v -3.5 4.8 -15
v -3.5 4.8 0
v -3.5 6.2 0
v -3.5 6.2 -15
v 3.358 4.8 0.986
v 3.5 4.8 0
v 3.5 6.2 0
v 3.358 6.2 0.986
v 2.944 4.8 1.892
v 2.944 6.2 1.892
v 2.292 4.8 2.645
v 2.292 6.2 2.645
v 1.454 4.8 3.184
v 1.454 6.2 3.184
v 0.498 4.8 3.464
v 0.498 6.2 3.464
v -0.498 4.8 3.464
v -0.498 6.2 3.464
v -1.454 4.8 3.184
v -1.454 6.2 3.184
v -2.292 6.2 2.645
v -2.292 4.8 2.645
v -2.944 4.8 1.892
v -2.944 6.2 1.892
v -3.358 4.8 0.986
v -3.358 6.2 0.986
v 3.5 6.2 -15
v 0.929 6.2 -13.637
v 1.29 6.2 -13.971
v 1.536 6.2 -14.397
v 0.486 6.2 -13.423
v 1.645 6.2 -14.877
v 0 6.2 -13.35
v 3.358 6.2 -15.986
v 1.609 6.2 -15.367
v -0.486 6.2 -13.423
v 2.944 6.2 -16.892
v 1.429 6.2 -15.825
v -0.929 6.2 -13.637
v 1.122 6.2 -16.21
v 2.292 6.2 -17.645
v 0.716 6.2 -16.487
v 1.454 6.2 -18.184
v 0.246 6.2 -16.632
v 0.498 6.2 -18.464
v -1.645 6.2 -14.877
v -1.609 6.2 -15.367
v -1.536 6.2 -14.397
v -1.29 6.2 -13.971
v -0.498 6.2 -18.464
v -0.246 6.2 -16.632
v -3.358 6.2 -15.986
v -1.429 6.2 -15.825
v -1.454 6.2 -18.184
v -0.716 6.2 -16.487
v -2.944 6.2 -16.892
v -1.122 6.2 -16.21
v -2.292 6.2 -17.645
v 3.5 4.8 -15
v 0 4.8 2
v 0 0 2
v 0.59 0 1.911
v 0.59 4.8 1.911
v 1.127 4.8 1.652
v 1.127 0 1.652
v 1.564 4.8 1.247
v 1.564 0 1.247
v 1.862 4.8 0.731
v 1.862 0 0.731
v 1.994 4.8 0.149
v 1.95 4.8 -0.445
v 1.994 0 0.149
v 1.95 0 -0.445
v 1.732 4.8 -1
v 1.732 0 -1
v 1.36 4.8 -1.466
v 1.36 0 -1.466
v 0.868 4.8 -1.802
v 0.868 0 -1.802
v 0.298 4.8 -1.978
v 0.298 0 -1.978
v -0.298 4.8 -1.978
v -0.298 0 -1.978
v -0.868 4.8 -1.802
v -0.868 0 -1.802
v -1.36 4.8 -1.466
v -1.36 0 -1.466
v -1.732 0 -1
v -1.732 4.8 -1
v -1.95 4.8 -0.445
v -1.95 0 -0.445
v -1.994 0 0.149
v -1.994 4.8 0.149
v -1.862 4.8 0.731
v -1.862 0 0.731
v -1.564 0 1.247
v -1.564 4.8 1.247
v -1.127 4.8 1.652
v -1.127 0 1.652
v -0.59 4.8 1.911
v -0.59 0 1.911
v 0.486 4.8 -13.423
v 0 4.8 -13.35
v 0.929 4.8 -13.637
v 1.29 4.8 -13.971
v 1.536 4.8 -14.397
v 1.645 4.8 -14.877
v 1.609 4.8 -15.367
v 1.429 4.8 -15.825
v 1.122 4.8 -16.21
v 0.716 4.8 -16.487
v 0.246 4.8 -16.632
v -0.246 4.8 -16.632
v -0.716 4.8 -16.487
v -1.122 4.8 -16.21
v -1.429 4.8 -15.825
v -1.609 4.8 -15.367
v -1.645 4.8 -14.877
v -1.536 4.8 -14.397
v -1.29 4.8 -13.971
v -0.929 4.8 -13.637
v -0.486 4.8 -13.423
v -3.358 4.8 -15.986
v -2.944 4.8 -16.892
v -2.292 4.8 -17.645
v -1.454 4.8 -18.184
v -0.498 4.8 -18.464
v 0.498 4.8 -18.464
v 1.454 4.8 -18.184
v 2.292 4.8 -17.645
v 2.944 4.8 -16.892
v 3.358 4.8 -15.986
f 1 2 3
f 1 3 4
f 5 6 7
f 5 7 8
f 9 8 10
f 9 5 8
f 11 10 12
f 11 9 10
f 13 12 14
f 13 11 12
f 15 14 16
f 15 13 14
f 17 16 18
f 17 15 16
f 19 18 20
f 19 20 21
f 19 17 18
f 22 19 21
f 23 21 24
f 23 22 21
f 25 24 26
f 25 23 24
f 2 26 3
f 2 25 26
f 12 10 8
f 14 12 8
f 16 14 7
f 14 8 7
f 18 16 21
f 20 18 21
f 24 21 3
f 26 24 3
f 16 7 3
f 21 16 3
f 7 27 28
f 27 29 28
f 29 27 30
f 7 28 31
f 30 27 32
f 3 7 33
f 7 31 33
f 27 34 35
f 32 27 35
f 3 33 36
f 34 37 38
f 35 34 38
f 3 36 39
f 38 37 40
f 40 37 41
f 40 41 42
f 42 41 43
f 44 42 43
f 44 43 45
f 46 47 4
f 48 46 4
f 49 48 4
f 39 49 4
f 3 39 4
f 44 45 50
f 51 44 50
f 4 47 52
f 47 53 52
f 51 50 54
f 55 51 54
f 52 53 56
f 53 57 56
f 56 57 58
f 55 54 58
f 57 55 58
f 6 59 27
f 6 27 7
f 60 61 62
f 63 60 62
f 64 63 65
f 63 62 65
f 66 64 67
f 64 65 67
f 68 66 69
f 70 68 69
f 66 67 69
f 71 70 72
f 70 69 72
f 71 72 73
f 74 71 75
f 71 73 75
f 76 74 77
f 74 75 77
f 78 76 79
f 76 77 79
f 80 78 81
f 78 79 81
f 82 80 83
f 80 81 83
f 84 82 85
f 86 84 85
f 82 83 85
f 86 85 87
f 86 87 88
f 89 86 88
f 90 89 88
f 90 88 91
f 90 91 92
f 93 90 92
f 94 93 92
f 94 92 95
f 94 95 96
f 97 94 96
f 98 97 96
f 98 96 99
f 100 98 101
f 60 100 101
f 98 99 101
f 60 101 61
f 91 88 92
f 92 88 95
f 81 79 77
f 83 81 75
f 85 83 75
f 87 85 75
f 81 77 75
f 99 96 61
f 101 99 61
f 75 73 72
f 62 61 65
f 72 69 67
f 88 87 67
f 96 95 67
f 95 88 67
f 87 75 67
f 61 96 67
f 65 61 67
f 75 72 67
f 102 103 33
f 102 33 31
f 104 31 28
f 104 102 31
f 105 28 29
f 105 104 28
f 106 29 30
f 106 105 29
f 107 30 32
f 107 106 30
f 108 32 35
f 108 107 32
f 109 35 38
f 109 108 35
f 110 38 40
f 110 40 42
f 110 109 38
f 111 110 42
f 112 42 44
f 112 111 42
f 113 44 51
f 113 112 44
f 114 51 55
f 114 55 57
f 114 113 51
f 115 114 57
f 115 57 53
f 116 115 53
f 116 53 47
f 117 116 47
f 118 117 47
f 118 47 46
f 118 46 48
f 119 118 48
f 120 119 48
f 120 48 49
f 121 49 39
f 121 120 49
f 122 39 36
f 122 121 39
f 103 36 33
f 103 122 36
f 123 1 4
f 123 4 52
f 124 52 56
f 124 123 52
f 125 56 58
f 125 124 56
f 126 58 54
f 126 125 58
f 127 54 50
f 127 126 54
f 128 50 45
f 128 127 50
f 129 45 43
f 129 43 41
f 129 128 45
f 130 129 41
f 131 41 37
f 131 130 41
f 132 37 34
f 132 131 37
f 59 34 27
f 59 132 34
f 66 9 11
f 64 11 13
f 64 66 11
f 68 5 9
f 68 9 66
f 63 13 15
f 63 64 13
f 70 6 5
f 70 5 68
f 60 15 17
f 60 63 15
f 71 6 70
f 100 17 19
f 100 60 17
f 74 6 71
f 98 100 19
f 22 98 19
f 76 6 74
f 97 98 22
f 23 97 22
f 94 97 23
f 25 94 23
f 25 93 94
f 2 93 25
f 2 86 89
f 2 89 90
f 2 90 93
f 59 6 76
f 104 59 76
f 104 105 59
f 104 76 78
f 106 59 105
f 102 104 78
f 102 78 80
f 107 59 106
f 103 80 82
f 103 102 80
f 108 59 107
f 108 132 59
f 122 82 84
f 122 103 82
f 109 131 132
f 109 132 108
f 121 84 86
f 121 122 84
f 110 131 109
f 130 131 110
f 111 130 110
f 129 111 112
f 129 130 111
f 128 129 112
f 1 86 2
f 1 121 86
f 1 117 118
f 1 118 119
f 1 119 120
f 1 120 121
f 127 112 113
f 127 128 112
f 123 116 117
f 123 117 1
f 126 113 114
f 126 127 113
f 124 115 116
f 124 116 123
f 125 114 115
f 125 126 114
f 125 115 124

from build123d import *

# Parameters (mm, degrees)
SKETCH_1_R      = 2
EXTRUDE_1_DEPTH = 4.8
SKETCH_2_R      = 1.65
EXTRUDE_2_DEPTH = 1.4


with BuildPart() as part:
    # 草图1 → 凸台-拉伸1 (new body)
    with BuildSketch(Plane(origin=(0, 0, 0), x_dir=(1, 0, 0), z_dir=(0, 1, 0))):
        with Locations(Location((0, 0, 0), (0, 0, 270))):
            Circle(SKETCH_1_R)
    extrude(amount=EXTRUDE_1_DEPTH)

    # 草图2 → 凸台-拉伸2 (add)
    with BuildSketch(Plane(origin=(0, 4.8, 0), x_dir=(1, 0, 0), z_dir=(0, 1, 0))):
        with BuildLine():
            Line((-3.5, 0), (-3.5, 15))
            ThreePointArc((-3.5, 15), (0, 18.5), (3.5, 15))
            Line((3.5, 15), (3.5, 0))
            ThreePointArc((3.5, 0), (0, -3.5), (-3.5, 0))
        make_face()
        with Locations(Location((0, 15, 0), (0, 0, 270))):
            Circle(SKETCH_2_R, mode=Mode.SUBTRACT)
    extrude(amount=EXTRUDE_2_DEPTH)


solid = part.part
